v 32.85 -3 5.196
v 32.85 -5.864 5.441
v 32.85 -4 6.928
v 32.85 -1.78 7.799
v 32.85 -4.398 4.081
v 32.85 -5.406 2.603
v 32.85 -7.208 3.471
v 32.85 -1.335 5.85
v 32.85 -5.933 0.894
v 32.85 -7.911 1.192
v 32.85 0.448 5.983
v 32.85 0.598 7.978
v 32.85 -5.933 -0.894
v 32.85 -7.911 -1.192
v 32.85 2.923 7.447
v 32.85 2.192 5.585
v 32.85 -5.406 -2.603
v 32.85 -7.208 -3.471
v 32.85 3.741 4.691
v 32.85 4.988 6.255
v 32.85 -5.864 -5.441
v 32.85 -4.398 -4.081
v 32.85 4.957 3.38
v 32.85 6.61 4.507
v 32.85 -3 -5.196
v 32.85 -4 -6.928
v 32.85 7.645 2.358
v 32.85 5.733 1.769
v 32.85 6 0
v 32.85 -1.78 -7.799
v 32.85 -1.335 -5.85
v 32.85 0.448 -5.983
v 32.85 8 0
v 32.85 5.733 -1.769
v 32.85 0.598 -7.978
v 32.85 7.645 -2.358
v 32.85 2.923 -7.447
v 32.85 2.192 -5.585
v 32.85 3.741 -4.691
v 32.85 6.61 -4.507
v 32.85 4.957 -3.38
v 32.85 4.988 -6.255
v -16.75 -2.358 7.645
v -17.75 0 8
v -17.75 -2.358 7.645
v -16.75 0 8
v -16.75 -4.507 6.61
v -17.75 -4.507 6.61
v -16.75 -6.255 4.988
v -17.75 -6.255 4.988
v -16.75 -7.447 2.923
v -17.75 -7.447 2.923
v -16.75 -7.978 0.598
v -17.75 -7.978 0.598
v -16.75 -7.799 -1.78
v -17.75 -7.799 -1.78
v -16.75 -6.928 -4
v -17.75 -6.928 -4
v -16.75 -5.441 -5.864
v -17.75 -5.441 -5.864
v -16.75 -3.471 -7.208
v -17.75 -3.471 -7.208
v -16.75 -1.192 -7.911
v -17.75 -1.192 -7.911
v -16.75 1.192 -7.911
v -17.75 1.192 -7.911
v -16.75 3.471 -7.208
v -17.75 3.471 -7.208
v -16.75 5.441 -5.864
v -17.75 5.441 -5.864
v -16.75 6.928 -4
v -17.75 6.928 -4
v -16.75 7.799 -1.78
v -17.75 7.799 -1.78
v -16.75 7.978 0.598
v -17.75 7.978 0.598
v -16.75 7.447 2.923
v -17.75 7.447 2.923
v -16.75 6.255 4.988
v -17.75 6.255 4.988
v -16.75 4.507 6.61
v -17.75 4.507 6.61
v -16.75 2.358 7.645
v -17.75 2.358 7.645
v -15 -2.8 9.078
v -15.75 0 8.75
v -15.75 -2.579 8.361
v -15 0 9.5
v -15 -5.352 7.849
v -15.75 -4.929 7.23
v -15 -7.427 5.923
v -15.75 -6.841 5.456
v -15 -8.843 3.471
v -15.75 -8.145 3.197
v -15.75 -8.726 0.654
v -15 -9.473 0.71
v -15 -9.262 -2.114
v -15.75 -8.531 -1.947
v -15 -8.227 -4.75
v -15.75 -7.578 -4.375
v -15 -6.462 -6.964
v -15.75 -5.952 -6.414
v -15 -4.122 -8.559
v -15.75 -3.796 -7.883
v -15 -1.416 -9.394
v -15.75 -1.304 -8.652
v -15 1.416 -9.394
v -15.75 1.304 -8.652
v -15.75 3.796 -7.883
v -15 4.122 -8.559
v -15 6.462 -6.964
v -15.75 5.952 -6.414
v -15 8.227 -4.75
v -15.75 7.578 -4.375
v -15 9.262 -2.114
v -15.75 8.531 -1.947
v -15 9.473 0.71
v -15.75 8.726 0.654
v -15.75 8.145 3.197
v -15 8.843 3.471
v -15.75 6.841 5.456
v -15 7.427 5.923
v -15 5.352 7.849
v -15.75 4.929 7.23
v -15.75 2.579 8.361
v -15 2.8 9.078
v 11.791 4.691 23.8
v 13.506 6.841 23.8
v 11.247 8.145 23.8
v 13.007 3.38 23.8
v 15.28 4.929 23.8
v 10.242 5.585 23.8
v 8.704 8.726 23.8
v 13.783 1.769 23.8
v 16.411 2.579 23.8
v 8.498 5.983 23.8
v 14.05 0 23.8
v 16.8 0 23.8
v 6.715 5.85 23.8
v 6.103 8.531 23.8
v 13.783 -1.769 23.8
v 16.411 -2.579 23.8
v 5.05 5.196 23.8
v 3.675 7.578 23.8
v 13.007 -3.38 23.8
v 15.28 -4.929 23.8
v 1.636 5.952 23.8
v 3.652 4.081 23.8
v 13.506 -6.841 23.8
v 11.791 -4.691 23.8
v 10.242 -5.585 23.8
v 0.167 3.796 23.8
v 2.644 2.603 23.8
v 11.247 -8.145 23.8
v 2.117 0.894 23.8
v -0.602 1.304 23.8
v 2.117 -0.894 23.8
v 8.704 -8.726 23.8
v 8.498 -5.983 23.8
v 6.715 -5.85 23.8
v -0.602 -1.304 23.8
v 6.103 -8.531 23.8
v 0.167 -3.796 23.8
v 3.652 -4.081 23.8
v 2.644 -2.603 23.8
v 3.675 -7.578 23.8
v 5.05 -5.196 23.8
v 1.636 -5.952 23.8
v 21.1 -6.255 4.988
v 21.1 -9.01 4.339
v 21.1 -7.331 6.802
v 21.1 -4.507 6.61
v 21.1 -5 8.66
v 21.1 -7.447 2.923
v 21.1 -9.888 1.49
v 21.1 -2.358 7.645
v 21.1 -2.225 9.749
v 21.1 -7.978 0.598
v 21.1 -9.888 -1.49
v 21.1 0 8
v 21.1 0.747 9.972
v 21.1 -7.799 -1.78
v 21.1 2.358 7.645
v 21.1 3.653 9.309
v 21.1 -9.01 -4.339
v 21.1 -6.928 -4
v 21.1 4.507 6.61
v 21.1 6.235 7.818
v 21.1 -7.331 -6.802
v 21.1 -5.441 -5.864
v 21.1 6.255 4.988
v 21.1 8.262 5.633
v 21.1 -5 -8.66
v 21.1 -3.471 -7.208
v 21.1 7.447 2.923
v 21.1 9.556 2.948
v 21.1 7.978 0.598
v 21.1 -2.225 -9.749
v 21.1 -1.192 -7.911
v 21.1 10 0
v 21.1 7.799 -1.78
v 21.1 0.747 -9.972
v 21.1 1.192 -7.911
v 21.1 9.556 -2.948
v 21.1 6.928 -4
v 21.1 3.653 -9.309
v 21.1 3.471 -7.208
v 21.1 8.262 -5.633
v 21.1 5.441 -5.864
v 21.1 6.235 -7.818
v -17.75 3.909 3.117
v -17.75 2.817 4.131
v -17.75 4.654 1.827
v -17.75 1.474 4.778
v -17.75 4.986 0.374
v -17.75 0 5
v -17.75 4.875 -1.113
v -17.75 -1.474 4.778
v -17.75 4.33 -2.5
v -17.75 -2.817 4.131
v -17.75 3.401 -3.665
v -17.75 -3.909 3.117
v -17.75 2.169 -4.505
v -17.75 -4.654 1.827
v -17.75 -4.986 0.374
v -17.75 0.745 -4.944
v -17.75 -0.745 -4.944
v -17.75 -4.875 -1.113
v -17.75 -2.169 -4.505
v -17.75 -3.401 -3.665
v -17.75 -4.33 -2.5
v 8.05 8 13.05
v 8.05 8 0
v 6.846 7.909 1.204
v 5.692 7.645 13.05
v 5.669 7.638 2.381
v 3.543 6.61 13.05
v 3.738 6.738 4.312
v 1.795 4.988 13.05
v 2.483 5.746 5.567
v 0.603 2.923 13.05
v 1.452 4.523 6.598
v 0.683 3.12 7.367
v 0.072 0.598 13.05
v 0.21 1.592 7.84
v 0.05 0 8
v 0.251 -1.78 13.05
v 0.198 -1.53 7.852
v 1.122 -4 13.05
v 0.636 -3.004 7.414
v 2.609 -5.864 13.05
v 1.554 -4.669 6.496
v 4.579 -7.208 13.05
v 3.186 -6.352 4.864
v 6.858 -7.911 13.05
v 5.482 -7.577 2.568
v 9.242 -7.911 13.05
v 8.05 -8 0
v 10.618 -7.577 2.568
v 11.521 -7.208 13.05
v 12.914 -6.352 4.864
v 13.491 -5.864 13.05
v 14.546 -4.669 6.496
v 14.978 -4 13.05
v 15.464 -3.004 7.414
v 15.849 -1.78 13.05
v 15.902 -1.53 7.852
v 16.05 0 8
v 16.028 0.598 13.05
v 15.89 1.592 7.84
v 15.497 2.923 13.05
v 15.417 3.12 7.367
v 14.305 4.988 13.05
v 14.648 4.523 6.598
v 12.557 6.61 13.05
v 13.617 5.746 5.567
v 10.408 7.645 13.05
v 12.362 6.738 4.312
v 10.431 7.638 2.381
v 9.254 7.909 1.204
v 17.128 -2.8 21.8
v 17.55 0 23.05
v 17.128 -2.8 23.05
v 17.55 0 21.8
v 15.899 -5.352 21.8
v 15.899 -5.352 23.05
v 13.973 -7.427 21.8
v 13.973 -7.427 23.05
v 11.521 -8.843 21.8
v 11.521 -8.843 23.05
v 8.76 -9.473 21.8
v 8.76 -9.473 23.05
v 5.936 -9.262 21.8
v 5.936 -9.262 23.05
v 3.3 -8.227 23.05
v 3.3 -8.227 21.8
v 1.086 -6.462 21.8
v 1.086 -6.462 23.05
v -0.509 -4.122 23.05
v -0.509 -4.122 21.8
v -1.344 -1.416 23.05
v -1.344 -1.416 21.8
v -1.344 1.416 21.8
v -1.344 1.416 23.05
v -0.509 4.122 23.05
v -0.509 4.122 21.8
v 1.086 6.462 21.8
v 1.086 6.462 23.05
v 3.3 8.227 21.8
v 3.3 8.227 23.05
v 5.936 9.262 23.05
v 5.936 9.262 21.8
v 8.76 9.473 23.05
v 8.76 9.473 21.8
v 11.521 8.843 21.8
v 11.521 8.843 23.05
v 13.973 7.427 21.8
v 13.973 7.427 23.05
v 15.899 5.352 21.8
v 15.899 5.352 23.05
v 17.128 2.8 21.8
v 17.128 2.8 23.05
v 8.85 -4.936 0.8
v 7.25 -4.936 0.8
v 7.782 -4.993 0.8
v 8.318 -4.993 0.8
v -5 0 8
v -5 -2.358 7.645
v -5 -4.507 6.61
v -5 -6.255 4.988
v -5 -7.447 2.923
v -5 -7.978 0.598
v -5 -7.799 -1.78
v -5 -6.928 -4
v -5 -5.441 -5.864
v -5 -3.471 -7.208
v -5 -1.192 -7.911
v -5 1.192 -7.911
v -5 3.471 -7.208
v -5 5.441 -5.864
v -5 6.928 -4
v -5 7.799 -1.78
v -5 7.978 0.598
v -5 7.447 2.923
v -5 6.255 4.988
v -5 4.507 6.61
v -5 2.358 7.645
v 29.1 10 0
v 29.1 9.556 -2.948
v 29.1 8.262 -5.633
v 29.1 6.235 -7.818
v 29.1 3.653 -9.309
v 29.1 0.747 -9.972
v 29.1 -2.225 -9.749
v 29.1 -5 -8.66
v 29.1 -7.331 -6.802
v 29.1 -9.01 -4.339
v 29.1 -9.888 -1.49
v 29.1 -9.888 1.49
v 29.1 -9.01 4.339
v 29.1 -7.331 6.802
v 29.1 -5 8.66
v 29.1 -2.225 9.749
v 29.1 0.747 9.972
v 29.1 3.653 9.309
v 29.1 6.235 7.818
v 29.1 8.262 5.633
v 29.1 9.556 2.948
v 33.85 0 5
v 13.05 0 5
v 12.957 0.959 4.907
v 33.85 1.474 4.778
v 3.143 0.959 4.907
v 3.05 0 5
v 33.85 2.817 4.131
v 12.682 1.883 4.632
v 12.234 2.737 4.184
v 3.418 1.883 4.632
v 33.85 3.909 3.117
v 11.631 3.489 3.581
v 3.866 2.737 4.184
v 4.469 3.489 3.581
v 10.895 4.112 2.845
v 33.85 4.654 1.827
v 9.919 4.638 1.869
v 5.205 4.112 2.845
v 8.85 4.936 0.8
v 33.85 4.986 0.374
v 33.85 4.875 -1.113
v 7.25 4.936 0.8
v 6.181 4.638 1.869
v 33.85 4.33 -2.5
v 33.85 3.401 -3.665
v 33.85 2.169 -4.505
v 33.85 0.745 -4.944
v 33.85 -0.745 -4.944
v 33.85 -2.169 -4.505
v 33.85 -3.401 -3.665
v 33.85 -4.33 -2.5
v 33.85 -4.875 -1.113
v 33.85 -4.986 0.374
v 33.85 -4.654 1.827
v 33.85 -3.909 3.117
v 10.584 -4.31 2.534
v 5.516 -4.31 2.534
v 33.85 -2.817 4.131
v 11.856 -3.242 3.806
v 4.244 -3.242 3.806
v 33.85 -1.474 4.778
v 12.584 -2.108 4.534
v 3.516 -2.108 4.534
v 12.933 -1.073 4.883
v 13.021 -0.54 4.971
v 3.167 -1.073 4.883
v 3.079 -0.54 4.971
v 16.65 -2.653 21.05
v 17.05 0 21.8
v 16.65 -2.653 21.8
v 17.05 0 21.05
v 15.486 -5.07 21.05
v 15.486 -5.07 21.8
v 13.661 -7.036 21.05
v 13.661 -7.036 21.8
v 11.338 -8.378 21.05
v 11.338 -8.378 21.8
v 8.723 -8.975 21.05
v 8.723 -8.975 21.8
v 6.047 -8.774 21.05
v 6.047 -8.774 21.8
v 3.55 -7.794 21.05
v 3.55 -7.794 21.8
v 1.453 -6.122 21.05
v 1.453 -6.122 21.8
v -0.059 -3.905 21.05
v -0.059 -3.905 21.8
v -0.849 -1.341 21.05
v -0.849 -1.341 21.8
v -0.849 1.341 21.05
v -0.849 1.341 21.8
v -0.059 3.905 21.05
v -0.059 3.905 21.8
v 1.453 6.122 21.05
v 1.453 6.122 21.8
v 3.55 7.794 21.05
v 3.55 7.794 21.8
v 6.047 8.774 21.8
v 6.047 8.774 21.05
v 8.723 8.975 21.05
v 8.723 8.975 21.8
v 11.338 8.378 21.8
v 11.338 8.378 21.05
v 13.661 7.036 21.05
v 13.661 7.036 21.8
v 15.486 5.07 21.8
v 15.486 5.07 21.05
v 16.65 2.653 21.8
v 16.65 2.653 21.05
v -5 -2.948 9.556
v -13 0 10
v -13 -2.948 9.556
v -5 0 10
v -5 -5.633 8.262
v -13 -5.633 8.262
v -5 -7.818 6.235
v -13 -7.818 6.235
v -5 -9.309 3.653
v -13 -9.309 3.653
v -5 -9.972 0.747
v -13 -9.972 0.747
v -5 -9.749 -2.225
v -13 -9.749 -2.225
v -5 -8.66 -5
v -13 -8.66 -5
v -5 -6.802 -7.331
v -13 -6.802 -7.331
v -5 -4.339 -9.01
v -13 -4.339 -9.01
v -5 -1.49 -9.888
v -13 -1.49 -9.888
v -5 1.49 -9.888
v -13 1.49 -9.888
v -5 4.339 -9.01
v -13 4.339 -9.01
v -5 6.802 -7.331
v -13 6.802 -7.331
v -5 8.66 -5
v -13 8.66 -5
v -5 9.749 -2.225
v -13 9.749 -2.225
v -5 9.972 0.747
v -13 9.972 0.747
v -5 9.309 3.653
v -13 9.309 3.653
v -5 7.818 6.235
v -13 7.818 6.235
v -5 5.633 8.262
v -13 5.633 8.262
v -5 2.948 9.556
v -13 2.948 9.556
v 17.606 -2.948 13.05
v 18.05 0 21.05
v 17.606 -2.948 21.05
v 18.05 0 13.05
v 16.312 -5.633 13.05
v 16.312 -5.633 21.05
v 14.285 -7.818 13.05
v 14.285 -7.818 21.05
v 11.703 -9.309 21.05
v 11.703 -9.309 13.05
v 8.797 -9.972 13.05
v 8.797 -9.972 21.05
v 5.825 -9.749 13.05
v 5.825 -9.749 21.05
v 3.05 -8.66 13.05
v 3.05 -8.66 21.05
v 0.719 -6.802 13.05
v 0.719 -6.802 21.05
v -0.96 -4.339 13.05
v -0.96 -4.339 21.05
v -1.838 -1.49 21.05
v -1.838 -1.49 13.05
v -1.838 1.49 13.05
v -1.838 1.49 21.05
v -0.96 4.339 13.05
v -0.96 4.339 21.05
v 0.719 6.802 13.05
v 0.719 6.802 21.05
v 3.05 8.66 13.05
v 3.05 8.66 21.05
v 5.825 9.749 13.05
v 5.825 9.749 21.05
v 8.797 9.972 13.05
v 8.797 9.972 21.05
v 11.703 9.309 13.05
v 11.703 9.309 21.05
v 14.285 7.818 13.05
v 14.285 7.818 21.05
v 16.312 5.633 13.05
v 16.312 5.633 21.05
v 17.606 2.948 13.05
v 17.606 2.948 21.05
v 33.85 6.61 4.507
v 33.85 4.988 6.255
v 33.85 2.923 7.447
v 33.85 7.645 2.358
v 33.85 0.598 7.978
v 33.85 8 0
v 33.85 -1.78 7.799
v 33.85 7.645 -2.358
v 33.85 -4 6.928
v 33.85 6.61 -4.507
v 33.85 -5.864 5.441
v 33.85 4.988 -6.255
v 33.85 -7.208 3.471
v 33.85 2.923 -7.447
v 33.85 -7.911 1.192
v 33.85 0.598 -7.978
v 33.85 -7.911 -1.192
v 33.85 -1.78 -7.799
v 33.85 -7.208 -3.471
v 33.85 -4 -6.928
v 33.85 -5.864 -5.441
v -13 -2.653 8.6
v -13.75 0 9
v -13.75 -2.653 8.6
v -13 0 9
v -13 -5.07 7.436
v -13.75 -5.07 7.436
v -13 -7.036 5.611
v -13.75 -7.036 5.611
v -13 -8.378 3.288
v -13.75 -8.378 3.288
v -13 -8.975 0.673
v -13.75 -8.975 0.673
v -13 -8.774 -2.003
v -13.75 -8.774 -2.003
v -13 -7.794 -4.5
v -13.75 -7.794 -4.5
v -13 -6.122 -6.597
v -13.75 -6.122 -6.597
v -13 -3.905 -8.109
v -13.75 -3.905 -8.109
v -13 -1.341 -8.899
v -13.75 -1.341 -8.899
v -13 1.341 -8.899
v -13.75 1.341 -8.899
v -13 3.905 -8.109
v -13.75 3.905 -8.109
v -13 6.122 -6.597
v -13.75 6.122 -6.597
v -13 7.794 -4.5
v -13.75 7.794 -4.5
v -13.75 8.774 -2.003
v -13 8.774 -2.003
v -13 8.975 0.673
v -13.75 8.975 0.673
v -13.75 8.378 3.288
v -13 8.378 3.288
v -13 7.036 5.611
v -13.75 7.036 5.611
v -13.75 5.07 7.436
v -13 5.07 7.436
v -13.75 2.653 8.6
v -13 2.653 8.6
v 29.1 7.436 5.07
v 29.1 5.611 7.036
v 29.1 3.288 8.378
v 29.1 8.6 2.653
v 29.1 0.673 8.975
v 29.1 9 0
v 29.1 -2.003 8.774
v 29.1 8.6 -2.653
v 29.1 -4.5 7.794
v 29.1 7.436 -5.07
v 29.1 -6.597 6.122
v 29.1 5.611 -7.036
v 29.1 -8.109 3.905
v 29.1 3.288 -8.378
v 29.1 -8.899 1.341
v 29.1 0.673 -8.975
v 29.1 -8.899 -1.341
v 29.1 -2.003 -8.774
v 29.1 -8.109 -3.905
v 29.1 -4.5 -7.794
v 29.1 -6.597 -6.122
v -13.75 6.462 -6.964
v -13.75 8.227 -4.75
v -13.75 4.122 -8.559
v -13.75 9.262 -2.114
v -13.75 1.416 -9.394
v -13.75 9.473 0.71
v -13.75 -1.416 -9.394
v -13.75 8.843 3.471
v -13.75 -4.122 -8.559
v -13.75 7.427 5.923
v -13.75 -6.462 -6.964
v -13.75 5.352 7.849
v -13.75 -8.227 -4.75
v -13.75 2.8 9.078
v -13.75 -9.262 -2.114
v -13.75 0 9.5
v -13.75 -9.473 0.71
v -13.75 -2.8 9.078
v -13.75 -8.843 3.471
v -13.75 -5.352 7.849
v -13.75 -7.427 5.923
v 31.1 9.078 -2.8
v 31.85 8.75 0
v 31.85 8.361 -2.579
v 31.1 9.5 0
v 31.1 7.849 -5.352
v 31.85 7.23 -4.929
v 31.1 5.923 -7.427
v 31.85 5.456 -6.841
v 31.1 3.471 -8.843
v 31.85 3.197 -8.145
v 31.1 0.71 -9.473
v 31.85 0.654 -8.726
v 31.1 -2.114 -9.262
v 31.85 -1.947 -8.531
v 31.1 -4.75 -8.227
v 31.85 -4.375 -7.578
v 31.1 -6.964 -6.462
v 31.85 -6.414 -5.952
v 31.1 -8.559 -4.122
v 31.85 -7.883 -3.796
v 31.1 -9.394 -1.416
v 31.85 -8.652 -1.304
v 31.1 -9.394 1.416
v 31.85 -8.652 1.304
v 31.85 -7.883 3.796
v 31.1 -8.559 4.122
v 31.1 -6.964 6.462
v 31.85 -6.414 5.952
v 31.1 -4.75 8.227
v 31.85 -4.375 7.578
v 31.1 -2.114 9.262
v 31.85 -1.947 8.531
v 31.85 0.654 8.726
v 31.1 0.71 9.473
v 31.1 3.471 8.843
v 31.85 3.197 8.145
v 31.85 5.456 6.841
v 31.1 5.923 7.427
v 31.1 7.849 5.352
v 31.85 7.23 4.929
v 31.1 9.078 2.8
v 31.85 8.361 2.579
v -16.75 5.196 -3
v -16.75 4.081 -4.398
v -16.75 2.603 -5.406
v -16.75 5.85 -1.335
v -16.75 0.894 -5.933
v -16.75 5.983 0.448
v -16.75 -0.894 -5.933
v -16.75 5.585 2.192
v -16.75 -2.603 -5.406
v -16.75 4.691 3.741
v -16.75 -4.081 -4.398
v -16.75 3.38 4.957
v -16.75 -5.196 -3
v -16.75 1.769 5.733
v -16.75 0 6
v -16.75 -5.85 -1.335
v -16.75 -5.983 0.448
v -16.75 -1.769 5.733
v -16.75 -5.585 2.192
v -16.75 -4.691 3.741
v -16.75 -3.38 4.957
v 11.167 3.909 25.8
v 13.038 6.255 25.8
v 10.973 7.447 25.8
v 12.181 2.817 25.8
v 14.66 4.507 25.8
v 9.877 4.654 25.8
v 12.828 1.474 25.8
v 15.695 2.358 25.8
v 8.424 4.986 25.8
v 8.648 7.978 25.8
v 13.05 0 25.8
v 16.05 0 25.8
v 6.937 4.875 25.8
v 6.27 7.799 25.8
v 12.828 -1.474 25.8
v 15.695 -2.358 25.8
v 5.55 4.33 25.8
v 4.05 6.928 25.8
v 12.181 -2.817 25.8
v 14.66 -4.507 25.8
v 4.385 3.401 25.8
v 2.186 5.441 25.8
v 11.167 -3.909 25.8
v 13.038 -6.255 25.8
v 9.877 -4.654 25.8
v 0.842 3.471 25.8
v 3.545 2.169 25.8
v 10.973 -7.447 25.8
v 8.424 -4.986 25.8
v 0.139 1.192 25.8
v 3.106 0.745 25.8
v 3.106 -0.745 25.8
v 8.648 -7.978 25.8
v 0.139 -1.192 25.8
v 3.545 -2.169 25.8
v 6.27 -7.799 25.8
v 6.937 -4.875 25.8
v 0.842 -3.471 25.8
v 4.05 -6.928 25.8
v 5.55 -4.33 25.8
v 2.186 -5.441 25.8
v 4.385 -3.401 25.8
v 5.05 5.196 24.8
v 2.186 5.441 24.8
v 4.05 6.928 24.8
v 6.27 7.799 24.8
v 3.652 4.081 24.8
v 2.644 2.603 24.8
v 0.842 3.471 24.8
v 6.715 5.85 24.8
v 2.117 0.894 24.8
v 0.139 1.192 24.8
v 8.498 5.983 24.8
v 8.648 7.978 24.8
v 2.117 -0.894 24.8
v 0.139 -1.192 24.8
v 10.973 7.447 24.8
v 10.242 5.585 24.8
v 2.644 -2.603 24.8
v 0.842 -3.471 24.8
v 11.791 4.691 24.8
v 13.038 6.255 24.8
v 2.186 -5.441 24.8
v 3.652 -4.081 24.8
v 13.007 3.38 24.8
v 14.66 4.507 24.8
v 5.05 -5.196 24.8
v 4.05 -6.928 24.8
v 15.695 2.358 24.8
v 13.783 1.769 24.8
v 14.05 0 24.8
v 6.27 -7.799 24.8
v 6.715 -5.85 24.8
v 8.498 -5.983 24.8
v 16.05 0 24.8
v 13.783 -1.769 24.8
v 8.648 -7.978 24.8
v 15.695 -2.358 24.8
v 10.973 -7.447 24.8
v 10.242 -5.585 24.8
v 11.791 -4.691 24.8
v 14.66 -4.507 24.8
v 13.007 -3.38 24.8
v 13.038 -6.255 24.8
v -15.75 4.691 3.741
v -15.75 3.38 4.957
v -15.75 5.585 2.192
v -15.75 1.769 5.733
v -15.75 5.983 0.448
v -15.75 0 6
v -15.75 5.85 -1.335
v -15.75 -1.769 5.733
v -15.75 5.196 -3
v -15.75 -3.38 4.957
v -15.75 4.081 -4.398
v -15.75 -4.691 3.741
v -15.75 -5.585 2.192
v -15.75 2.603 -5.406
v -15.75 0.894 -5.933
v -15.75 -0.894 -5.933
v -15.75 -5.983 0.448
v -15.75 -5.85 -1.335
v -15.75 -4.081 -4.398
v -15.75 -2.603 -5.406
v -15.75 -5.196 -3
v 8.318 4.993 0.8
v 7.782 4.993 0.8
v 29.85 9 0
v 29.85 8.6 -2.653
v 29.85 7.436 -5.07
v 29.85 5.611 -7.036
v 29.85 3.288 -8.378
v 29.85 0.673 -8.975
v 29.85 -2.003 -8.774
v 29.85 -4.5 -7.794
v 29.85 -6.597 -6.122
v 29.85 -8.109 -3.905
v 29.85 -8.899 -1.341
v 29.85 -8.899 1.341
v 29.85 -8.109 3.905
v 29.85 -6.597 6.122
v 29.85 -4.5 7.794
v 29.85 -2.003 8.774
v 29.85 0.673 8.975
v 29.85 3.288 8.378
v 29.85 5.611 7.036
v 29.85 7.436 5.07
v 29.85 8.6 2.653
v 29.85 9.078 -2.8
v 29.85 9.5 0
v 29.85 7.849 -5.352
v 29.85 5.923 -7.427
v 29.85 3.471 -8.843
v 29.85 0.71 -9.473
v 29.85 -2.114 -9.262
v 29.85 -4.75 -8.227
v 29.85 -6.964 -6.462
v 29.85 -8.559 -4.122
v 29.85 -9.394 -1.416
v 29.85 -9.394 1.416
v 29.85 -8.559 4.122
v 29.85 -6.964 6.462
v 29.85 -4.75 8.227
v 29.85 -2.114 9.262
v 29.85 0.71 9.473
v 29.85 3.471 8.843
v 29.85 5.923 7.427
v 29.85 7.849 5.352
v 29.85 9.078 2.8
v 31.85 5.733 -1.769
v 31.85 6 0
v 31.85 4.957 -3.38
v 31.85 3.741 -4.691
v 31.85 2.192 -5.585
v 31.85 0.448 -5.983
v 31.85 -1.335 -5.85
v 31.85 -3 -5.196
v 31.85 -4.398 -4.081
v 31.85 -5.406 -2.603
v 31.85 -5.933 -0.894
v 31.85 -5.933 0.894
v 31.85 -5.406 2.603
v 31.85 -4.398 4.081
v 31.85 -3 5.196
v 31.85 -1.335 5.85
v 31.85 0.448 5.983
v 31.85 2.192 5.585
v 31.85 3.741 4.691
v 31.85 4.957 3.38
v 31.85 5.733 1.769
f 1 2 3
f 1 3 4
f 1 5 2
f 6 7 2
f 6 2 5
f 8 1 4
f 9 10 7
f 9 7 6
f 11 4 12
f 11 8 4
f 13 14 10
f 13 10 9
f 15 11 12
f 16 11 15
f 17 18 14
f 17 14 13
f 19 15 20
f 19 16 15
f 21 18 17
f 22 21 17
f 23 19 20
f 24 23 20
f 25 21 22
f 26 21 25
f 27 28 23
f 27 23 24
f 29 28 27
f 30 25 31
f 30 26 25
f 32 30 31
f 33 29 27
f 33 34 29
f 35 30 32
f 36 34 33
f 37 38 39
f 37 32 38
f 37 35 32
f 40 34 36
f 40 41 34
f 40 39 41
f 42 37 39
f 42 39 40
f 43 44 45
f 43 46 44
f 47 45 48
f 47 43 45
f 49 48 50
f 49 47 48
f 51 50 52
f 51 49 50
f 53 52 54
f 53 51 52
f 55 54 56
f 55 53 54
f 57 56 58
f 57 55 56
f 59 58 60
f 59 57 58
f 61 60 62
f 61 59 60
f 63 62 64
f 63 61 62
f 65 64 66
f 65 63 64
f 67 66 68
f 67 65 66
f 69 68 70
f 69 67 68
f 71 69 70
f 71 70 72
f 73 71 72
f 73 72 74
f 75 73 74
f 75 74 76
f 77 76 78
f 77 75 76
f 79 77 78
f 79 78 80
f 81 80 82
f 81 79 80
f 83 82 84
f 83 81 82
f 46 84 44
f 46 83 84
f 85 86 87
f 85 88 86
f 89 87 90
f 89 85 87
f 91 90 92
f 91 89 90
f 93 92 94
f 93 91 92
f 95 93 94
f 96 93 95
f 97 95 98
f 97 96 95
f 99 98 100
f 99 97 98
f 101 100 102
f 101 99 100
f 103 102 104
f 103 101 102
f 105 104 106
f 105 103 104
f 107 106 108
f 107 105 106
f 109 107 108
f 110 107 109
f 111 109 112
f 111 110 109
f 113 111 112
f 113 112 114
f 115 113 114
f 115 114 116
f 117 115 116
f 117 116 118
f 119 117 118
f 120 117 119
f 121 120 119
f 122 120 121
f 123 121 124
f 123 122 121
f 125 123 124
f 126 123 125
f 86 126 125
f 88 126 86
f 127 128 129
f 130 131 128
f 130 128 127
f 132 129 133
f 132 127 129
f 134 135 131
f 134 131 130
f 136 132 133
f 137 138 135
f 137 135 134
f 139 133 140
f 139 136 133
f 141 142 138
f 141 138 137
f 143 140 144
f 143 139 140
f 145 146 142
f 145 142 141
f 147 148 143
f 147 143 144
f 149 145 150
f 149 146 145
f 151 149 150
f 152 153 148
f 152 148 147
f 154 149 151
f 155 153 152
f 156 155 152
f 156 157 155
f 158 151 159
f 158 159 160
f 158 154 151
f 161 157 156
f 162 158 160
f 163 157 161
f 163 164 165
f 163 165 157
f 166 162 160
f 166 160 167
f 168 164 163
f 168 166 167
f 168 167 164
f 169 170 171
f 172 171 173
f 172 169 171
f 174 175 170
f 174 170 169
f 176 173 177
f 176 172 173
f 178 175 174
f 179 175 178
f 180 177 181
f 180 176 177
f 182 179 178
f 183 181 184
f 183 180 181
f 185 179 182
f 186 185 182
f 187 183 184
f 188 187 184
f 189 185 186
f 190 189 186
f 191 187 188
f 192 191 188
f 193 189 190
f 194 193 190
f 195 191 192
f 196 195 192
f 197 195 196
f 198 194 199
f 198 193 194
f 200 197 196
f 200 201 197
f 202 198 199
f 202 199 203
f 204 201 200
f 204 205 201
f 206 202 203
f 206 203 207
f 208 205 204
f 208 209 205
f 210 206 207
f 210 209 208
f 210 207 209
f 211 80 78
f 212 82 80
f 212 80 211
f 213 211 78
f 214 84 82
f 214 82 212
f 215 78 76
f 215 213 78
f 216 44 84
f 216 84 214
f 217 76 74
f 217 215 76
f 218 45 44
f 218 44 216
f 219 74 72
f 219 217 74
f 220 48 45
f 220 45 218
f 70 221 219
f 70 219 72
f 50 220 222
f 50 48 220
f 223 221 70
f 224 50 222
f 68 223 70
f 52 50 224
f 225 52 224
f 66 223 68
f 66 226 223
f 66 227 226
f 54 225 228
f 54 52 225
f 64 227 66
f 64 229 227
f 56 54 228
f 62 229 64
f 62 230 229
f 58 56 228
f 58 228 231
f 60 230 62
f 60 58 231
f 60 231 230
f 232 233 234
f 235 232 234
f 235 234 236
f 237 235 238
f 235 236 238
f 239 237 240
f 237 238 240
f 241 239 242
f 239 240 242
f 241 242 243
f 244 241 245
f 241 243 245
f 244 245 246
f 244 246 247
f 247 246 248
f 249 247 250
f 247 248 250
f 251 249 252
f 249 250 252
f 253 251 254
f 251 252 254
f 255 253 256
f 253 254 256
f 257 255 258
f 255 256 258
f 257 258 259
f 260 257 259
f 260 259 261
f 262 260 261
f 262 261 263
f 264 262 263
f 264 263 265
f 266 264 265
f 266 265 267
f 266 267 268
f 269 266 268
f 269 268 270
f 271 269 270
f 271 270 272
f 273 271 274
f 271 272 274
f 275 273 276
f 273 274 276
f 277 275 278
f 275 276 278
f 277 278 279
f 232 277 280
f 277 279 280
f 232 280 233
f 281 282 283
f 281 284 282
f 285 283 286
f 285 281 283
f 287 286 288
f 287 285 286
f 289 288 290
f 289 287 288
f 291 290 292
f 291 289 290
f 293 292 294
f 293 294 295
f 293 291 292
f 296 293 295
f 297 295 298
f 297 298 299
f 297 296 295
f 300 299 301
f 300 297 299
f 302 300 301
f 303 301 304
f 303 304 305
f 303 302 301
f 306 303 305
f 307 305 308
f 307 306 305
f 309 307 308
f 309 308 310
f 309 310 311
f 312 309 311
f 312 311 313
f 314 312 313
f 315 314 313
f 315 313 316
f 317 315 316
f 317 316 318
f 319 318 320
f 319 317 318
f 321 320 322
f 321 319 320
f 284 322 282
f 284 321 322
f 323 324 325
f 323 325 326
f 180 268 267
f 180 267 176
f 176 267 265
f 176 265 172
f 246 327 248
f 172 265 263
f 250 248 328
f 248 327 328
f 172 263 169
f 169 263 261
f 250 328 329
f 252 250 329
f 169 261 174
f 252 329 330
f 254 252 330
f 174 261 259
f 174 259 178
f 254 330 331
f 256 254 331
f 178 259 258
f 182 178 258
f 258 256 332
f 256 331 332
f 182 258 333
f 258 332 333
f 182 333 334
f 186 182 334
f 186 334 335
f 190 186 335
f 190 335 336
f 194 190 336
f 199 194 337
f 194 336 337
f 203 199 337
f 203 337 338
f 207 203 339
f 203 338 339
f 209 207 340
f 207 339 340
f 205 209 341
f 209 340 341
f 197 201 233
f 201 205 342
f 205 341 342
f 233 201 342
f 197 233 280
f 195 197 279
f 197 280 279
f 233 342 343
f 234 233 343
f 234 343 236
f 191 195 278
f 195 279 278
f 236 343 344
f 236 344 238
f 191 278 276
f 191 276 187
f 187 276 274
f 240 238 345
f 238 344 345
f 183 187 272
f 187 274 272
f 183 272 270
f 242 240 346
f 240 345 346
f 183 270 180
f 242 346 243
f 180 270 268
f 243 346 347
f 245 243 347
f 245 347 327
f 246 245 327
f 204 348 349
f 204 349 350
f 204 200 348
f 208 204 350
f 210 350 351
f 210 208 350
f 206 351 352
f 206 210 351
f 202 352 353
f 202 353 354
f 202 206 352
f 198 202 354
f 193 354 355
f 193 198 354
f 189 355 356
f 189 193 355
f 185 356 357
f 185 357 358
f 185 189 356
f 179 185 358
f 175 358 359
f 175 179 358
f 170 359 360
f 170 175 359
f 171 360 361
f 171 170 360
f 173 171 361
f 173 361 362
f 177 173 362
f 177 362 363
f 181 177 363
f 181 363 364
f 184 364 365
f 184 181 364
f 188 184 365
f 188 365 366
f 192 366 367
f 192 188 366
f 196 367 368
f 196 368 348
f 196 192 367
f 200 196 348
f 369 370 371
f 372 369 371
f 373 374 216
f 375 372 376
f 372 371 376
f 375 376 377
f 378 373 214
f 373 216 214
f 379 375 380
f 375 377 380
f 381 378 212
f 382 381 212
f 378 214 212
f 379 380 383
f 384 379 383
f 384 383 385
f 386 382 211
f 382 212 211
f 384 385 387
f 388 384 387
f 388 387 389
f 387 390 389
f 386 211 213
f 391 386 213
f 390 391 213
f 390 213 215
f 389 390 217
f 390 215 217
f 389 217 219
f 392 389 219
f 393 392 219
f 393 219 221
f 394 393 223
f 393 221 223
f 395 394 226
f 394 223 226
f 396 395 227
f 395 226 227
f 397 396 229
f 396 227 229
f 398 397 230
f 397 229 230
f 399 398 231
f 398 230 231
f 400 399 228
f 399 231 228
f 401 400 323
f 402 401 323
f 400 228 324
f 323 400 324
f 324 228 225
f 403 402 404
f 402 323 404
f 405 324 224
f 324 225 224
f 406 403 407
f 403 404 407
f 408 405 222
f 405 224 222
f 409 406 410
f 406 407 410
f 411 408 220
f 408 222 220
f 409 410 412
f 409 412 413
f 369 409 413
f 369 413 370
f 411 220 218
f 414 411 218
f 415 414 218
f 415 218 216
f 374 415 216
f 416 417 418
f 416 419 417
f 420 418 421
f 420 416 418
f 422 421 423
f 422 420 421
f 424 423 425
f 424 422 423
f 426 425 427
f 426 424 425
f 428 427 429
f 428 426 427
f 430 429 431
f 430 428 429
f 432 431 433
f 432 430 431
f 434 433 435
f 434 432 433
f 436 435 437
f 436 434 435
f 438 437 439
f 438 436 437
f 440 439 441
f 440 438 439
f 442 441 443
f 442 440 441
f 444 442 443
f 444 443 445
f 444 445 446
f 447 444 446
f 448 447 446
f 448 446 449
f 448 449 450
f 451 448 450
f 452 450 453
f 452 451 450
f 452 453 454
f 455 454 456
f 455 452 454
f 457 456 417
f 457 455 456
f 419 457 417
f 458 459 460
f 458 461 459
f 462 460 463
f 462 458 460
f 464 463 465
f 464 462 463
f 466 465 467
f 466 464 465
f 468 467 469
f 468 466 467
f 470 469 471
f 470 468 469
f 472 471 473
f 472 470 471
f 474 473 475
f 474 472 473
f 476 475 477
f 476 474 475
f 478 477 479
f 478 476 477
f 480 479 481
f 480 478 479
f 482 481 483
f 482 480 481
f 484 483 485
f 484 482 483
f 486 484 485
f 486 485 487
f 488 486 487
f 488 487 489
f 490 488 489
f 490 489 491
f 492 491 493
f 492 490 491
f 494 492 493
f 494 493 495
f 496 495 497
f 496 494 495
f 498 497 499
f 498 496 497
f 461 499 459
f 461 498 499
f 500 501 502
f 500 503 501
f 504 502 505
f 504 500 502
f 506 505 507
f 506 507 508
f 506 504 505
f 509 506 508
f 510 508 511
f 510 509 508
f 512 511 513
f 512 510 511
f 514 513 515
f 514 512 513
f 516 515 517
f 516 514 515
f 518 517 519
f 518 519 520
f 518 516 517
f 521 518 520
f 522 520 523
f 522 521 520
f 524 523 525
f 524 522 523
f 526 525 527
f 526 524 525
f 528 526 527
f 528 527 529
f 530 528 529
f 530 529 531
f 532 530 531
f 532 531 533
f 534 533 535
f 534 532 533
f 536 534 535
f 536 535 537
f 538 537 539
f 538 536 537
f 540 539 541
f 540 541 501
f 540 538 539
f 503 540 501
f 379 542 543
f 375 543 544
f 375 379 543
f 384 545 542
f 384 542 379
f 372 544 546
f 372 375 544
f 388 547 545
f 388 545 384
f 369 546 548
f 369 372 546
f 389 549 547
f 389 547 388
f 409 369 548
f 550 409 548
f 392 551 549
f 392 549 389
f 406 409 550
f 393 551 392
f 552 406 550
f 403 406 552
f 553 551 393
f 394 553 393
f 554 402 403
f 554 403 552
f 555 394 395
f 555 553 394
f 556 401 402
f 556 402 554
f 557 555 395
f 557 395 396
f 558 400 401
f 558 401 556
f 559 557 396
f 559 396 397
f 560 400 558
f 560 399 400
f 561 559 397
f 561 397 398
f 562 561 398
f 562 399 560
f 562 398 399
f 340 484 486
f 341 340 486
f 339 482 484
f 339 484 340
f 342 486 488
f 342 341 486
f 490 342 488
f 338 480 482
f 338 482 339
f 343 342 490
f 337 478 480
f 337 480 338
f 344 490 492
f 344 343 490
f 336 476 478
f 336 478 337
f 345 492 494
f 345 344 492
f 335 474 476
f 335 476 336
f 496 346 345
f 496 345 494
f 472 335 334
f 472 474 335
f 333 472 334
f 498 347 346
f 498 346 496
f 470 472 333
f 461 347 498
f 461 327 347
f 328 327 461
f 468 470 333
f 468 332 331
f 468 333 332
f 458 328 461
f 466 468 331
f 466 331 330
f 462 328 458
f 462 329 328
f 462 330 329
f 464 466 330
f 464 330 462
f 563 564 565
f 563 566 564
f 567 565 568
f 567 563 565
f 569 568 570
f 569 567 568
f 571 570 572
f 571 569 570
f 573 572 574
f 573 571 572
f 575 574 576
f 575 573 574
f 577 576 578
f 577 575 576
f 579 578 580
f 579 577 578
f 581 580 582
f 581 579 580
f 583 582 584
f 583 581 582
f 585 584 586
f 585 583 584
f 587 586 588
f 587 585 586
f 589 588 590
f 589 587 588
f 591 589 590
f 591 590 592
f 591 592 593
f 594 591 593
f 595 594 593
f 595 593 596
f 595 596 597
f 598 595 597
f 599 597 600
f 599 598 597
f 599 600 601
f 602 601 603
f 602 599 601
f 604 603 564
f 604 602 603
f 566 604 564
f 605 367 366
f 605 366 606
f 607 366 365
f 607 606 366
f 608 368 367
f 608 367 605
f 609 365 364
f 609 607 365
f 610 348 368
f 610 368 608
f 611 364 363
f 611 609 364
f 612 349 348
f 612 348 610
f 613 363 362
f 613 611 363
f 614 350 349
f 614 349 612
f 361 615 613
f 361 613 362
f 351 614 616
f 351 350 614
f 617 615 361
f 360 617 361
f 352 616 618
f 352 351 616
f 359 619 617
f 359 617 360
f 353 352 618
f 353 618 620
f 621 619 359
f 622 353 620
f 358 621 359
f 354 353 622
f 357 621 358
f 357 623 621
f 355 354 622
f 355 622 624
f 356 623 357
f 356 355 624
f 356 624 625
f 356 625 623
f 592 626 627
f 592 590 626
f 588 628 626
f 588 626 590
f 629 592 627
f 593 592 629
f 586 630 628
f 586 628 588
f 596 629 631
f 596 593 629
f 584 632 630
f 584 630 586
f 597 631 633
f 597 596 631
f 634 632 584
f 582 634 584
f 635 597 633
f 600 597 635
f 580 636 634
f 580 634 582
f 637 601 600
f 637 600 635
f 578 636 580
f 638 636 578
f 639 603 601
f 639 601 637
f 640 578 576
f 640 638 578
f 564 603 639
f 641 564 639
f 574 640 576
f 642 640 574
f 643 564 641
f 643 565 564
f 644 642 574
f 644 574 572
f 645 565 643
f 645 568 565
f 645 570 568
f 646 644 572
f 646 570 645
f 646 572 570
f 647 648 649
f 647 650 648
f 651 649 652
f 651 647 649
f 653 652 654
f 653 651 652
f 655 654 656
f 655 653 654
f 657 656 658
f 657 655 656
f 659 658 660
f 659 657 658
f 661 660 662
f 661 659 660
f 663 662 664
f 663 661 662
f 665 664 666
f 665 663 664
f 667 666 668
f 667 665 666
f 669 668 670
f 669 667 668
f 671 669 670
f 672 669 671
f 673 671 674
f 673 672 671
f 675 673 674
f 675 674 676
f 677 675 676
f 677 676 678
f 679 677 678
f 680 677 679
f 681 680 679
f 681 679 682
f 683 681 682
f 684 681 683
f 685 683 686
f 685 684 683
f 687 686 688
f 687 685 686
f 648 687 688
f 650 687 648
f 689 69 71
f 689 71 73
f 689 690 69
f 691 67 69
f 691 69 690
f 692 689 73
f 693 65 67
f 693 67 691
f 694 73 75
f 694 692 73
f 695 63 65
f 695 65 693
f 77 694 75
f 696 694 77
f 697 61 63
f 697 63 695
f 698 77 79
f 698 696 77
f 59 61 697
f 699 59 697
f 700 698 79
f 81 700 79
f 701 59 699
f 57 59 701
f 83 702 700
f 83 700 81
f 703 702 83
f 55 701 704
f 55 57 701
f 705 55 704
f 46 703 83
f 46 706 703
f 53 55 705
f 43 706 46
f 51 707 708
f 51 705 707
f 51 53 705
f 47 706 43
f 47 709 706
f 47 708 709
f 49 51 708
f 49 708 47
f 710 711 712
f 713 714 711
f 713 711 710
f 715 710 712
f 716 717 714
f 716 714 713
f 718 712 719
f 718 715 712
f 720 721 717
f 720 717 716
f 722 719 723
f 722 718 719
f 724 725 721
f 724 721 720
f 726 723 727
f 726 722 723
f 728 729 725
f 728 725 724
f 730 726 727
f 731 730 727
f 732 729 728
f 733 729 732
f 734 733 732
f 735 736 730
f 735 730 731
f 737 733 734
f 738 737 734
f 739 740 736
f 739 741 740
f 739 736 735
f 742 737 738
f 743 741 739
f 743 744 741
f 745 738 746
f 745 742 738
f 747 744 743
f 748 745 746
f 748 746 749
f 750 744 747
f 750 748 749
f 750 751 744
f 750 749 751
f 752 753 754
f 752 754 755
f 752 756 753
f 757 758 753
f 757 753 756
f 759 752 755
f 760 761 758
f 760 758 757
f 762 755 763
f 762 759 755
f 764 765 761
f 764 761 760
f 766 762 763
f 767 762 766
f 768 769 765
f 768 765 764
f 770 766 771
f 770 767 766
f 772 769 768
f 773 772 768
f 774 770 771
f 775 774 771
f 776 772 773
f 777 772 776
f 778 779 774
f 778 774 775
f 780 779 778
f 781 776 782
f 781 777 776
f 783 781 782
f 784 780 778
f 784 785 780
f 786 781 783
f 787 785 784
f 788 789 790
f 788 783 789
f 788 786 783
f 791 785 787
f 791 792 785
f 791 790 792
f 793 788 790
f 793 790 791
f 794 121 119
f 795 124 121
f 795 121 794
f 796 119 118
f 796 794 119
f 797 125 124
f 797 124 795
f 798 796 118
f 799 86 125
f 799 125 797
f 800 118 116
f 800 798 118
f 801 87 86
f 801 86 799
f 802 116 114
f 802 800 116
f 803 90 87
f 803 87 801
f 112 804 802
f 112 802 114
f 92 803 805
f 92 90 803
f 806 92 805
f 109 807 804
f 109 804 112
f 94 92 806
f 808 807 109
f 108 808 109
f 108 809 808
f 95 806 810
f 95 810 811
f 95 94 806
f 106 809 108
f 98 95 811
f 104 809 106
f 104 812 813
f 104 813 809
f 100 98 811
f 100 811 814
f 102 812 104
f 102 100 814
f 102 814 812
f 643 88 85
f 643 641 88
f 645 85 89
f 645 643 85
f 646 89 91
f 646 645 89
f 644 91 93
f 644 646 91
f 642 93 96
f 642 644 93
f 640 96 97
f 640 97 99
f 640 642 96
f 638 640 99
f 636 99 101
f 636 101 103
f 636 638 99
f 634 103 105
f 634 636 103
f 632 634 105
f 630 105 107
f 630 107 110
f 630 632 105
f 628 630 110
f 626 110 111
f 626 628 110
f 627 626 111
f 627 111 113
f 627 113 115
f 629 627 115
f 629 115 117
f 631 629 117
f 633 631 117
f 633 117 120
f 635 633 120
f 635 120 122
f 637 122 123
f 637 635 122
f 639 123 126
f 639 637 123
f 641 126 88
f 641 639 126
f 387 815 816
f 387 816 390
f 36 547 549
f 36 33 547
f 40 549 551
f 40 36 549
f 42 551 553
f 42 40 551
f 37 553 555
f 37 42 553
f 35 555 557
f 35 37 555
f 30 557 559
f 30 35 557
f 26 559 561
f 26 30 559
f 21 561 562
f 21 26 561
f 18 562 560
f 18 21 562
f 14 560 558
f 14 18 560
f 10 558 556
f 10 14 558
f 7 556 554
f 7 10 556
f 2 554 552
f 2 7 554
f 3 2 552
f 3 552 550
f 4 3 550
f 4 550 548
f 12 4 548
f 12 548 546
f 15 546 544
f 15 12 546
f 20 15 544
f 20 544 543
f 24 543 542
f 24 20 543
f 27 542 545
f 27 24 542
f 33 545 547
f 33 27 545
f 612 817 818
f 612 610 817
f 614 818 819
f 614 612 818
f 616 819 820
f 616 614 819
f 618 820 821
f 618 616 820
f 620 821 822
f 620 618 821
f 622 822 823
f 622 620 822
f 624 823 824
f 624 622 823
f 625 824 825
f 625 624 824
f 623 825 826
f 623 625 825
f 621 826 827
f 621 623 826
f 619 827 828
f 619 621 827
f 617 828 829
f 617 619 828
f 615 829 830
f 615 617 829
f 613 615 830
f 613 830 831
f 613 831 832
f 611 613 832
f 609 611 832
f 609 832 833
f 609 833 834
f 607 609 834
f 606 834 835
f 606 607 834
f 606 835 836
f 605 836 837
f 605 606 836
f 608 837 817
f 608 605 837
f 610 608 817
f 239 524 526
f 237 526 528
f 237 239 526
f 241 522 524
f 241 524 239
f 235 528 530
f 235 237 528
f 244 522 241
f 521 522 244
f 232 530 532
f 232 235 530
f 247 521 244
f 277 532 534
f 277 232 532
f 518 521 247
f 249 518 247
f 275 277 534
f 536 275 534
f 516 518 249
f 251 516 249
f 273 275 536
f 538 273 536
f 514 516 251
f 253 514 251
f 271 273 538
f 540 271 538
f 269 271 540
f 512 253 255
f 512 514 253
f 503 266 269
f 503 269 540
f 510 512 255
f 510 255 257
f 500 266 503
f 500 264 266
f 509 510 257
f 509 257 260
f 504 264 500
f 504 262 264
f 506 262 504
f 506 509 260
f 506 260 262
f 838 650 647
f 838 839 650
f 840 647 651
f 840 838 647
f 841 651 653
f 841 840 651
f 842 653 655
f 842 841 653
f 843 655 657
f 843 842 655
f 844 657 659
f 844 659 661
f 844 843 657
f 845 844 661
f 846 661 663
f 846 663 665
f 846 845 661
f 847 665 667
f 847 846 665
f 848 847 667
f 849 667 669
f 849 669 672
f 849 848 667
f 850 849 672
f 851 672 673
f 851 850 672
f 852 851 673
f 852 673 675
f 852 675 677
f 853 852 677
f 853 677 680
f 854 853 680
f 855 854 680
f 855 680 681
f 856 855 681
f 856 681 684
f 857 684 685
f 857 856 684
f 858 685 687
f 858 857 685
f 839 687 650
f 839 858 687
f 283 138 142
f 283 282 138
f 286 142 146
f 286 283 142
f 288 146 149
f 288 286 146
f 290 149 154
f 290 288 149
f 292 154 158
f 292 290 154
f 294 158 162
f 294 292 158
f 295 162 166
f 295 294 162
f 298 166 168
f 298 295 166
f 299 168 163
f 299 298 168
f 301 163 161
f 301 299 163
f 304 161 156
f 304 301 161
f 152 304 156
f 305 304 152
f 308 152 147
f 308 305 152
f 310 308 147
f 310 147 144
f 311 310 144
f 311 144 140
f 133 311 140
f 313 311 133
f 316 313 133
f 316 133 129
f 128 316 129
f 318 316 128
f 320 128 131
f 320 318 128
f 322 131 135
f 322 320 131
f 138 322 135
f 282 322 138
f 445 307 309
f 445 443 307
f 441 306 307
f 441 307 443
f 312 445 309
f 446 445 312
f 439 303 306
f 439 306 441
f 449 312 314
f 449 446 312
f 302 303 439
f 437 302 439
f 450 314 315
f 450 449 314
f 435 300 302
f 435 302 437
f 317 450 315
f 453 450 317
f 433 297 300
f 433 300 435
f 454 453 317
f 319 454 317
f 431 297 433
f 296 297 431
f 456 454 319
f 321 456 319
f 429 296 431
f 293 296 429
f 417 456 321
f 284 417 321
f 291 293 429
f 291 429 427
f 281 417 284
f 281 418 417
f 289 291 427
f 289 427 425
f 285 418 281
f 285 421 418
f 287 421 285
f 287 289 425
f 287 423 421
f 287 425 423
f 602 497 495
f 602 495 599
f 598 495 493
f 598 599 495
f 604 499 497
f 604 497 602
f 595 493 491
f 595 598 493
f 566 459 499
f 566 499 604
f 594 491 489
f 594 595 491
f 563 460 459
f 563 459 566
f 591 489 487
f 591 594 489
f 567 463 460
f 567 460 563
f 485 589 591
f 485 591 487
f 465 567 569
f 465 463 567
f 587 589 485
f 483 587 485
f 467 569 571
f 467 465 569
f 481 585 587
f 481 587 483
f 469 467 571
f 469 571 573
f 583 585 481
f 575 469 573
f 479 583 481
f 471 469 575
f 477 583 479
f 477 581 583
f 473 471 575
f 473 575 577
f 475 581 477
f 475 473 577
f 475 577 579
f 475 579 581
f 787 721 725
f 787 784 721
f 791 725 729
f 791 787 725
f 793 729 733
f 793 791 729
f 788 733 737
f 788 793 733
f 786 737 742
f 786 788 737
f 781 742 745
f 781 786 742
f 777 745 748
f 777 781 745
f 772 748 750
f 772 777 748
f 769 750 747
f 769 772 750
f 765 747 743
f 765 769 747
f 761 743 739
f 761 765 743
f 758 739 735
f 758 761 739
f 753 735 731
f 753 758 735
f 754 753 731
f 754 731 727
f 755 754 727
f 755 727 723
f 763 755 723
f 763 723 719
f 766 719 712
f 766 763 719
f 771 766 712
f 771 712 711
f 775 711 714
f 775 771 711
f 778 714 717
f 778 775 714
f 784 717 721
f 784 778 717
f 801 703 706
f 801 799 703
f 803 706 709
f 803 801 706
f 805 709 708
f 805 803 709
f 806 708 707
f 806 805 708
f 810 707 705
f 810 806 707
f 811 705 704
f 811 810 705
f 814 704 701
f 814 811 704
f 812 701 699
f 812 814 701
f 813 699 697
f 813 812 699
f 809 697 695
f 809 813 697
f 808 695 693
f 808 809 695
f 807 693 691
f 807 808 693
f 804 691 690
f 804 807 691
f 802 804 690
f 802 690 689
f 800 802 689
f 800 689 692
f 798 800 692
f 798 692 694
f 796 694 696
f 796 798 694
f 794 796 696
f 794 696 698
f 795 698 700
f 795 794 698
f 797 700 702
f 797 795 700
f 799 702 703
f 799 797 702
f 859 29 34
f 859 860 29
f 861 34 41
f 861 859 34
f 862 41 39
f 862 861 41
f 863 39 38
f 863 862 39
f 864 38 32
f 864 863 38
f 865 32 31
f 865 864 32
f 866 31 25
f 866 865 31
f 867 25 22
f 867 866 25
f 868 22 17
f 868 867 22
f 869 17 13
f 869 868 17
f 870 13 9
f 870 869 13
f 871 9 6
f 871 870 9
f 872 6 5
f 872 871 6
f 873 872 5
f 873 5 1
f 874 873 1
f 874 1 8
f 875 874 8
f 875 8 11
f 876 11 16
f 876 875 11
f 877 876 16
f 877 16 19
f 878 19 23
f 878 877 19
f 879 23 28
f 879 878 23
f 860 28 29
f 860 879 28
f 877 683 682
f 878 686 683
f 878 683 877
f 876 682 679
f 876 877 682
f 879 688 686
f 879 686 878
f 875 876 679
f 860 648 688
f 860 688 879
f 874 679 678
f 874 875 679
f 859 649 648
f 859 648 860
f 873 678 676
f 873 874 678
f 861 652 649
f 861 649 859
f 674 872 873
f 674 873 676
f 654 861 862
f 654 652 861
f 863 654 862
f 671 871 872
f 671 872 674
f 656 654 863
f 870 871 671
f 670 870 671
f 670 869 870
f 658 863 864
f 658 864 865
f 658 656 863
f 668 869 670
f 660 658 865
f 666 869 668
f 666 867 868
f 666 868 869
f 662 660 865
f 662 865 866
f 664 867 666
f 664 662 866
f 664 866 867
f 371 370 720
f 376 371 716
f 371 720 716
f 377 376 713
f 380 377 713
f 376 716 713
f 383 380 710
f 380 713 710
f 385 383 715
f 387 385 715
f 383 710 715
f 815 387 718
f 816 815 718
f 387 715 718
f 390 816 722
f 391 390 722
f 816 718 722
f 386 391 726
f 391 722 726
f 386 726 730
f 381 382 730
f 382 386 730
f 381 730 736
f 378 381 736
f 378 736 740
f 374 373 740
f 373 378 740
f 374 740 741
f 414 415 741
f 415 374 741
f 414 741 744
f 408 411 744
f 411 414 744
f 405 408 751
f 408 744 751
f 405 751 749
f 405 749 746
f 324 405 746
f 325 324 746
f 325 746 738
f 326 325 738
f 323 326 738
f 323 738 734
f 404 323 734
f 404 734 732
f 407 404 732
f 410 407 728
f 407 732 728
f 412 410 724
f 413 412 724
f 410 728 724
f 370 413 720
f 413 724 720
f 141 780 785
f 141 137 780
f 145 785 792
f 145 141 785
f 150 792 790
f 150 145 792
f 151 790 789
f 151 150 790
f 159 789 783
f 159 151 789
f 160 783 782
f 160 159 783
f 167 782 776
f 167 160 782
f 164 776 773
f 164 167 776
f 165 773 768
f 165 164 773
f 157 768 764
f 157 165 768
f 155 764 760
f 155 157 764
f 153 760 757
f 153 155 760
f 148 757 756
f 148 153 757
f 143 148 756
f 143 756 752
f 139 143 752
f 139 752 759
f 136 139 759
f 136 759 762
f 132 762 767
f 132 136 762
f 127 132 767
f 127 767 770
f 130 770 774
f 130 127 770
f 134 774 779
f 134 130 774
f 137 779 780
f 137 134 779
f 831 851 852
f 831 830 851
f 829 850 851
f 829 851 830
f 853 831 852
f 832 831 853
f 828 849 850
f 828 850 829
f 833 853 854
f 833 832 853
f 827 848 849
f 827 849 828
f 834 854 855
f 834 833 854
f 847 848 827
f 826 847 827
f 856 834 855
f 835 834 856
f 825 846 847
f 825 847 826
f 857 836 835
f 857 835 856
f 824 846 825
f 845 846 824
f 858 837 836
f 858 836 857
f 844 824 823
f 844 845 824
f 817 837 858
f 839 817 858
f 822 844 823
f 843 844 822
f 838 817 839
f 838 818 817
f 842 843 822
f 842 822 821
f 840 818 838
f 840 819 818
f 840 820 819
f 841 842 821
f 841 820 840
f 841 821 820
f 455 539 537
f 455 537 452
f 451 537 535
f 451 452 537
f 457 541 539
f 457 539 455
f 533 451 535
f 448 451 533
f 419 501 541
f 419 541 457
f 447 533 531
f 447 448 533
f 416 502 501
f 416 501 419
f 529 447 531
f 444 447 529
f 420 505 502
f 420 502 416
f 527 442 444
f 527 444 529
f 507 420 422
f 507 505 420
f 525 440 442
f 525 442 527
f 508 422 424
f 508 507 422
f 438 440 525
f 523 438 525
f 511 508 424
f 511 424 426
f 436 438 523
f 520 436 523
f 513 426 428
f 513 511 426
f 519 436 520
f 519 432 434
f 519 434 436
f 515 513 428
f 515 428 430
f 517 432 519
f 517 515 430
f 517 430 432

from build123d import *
from build123d.topology import SkipClean

# Parameters (mm, degrees)
SKETCH_2_R          = 8
SKETCH_2_R_2        = 4
EXTRUDE_1_DEPTH     = 26.1
SKETCH_4_R          = 8
EXTRUDE_2_DEPTH     = 13.05
SKETCH_6_R          = 5
CUT_EXTRUDE_1_DEPTH = 63.05
SKETCH_7_R          = 5
CUT_EXTRUDE_2_DEPTH = 25


with BuildPart() as part:
    # Эскиз1 → Повернуть1 (revolve)
    with BuildSketch(Plane.XY, mode=Mode.PRIVATE) as revolve_1_sk:
        Polygon((-16.75, -8), (-16.75, -6), (-15.75, -6), (-15.75, -8.75), (-15, -9.5), (-13.75, -9.5), (-13.75, -9), (-13, -9), (-13, -10), (-5, -10), (-5, -4), (-17.75, -4), (-17.75, -8), align=None)
    revolve(revolve_1_sk.sketch.rotate(Axis((-21.049489232, 0, 0), (1, 0, 0)), 270), axis=Axis((-21.049489232, 0, 0), (1, 0, 0)))

    # Эскиз2 → Бобышка-Вытянуть1 (add)
    with BuildSketch(Plane(origin=(-5, 0, 0), x_dir=(0, 0, -1), z_dir=(1, 0, 0))):
        with Locations(Location((0, 0, 0), (0, 0, 180))):
            Circle(SKETCH_2_R)
        with Locations(Location((0, 0, 0), (0, 0, 180))):
            Circle(SKETCH_2_R_2, mode=Mode.SUBTRACT)
    extrude(amount=EXTRUDE_1_DEPTH)

    # Эскиз3 → Повернуть2 (revolve)
    with SkipClean():  # the faces are left unmerged after this step: merging them gives an invalid solid
        with BuildSketch(Plane.XY):
            Polygon((32.85, 8), (32.85, 6), (31.85, 6), (31.85, 8.75), (31.1, 9.5), (29.85, 9.5), (29.85, 9), (29.1, 9), (29.1, 10), (21.1, 10), (21.1, 4), (33.85, 4), (33.85, 8), align=None)
        revolve(axis=Axis((47.149489232, 0, 0), (-1, 0, 0)))

    # Эскиз4 → Бобышка-Вытянуть2 (add)
    with SkipClean():  # the faces are left unmerged after this step: merging them gives an invalid solid
        with BuildSketch(Plane.XY):
            with Locations(Location((8.05, 0, 0), (0, 0, 90))):
                Circle(SKETCH_4_R)
        extrude(amount=EXTRUDE_2_DEPTH)

    # Эскиз5 → Повернуть3 (revolve)
    with SkipClean():  # the faces are left unmerged after this step: merging them gives an invalid solid
        with BuildSketch(Plane(origin=(0, 0, 0), x_dir=(1, 0, 0), z_dir=(0, 1, 0))):
            Polygon((16.05, -24.8), (14.05, -24.8), (14.05, -23.8), (16.8, -23.8), (17.55, -23.05), (17.55, -21.8), (17.05, -21.8), (17.05, -21.05), (18.05, -21.05), (18.05, -13.05), (12.05, -13.05), (12.05, -25.8), (16.05, -25.8), align=None)
        revolve(axis=Axis((8.05, 0, 29.099489232), (0, 0, -1)))

    # Эскиз6 → Вырез-Вытянуть1 (cut)
    with BuildSketch(Plane.ZY.offset(17.75)):
        Circle(SKETCH_6_R)
    extrude(amount=-CUT_EXTRUDE_1_DEPTH, mode=Mode.SUBTRACT)

    # Эскиз7 → Вырез-Вытянуть2 (cut)
    with BuildSketch(Plane.XY.offset(25.8)):
        with Locations((8.05, 0)):
            Circle(SKETCH_7_R)
    extrude(amount=-CUT_EXTRUDE_2_DEPTH, mode=Mode.SUBTRACT)


solid = part.part
